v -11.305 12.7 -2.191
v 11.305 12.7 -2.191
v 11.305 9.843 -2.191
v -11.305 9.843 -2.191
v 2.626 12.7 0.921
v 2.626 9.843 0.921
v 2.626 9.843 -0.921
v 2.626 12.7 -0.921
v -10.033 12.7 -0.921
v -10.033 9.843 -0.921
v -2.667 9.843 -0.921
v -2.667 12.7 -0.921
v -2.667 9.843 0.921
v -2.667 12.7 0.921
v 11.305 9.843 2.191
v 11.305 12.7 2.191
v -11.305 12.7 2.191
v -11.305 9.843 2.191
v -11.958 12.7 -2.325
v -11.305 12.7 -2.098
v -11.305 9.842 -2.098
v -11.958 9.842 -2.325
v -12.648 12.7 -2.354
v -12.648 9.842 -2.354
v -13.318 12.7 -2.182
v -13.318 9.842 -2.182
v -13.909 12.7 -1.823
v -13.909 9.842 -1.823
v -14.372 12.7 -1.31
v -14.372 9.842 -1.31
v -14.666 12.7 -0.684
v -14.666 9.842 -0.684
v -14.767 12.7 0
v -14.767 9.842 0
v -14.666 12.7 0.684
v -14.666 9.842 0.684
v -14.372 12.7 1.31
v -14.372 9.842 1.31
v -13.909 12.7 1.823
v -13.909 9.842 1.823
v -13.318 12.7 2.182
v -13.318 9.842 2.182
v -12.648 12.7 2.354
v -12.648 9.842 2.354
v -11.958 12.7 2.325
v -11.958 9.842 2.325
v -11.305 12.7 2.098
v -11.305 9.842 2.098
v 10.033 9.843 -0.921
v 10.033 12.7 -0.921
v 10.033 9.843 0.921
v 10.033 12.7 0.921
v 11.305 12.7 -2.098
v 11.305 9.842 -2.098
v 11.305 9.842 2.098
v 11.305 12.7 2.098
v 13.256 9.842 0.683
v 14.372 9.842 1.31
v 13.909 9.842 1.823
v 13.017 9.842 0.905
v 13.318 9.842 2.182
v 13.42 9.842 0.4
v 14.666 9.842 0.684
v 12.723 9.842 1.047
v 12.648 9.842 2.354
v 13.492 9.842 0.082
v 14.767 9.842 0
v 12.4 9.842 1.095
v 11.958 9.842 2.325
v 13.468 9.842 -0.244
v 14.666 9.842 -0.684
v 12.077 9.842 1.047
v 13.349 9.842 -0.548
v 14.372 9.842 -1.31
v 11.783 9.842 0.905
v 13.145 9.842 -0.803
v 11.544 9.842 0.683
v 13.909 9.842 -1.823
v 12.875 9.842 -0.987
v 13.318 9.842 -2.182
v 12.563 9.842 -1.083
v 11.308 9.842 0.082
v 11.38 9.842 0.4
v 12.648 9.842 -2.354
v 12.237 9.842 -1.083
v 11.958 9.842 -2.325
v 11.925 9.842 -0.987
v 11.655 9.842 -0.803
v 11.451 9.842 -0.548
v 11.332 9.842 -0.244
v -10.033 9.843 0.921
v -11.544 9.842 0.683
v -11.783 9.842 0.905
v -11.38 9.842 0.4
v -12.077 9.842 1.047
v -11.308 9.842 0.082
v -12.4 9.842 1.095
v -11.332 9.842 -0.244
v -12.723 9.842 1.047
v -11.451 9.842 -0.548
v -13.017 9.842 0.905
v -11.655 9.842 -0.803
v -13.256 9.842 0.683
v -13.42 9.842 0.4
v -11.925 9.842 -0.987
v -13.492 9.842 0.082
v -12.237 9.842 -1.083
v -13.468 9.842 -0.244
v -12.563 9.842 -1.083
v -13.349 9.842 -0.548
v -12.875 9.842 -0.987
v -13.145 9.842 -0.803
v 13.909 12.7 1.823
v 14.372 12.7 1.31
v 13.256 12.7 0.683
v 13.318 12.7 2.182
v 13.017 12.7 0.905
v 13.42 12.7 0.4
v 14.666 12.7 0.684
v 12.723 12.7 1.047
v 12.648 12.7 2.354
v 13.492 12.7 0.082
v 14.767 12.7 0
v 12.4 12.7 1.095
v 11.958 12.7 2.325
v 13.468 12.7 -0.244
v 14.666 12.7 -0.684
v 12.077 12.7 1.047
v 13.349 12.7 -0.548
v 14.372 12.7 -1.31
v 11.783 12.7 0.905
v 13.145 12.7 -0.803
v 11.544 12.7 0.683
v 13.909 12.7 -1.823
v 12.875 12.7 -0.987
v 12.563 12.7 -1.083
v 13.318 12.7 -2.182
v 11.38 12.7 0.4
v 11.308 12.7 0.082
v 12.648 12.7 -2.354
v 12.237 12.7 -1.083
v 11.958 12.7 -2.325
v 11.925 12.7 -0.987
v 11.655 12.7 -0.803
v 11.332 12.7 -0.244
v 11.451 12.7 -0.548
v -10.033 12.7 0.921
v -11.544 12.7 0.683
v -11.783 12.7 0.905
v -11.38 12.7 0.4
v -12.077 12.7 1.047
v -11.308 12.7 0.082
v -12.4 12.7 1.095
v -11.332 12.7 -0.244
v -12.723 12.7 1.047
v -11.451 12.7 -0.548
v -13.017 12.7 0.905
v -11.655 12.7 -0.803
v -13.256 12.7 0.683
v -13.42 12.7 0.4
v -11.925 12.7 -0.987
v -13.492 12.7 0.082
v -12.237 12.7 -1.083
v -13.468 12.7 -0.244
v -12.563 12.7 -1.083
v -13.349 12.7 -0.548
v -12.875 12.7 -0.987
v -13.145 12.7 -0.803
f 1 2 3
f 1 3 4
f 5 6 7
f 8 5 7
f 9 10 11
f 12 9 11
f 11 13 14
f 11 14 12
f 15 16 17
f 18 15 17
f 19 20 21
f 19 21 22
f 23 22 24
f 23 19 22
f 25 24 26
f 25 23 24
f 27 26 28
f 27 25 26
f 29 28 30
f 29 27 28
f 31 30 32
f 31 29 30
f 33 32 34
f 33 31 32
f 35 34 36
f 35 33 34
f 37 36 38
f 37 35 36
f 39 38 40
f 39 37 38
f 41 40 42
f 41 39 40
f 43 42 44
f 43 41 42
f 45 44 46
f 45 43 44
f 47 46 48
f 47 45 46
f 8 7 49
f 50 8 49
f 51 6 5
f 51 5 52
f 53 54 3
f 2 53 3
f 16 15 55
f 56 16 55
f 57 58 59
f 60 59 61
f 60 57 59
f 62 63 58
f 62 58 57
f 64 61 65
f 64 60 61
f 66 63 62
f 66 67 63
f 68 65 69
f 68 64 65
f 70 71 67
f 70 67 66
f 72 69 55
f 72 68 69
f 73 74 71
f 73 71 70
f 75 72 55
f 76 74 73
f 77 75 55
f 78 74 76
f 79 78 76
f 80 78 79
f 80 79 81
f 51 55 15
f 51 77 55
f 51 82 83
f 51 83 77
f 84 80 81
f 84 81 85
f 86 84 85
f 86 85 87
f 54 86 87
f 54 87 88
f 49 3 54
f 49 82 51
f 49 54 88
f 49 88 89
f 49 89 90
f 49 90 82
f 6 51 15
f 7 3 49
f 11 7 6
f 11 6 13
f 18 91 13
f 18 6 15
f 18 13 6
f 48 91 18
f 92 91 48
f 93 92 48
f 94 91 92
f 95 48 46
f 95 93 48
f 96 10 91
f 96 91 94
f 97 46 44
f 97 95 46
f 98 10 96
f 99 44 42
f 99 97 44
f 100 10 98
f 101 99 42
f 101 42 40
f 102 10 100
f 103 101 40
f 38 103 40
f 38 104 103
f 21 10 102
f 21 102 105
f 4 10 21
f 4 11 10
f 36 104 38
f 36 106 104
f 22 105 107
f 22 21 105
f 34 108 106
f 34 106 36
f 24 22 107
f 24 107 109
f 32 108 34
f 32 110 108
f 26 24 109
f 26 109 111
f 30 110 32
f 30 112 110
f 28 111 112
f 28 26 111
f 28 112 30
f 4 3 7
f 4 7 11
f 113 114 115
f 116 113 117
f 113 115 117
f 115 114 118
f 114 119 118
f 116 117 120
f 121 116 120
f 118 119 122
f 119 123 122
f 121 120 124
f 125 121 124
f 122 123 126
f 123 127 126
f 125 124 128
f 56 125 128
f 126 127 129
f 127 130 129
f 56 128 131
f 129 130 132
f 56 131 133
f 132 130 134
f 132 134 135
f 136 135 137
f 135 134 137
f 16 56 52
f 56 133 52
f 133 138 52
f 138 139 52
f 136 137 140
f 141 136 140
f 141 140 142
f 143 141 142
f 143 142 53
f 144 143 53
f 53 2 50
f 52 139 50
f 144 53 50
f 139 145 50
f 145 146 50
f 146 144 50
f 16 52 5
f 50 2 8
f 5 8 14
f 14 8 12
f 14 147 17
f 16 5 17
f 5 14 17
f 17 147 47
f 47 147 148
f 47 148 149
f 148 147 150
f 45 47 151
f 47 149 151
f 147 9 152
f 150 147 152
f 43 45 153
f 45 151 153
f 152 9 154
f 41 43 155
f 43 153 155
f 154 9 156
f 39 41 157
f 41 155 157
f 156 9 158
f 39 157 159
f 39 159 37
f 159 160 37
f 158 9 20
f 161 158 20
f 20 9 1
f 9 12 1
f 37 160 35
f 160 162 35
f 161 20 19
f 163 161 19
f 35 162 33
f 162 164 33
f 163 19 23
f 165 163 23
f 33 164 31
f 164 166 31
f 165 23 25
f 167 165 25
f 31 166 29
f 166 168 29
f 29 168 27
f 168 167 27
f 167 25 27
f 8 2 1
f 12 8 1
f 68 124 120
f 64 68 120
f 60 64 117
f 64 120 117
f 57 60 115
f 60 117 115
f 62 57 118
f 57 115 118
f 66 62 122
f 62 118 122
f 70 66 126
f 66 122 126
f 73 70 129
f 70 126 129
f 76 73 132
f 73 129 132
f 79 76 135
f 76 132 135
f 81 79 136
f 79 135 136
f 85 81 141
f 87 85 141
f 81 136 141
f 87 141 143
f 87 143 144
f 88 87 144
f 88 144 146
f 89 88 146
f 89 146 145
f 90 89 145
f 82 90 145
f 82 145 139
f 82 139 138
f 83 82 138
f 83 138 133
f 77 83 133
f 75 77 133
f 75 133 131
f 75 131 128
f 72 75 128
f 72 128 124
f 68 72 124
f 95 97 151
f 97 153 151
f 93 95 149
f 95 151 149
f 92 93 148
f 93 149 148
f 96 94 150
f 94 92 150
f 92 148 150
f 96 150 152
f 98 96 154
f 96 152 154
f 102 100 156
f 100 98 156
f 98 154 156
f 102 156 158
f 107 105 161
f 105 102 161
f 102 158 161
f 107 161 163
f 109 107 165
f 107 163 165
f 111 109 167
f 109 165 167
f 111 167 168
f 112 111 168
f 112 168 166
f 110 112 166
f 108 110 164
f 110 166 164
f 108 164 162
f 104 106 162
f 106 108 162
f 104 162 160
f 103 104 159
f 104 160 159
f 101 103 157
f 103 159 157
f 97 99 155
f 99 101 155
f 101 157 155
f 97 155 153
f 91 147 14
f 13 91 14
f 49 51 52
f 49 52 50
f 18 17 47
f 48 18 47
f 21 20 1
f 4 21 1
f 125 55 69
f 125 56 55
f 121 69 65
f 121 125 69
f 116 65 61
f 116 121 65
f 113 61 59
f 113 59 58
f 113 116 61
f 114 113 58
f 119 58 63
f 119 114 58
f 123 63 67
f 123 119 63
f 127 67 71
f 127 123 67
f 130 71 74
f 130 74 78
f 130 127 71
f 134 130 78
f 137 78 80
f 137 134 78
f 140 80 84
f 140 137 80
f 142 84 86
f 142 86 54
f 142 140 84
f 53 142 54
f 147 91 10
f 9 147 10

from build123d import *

# Parameters (mm, degrees)
SKETCH1_W                = 22.609360872
SKETCH1_H                = 4.3815
SKETCH1_W_2              = 7.366
SKETCH1_H_2              = 1.8415
SKETCH1_W_3              = 7.407296779
BOSS_EXTRUDE1_DEPTH      = 6.35
BOSS_EXTRUDE2_REACH      = 15.15
BOSS_EXTRUDE3_START      = 2.19075
BOSS_EXTRUDE3_DEPTH      = 2.19075
SKETCH7_R                = 1.5875
BOSS_EXTRUDE4_DEPTH      = 1.27
MIRROR2_COPY_1_SKETCH_R  = 1.5875
MIRROR2_COPY_1_DEPTH     = 1.27
BOSS_EXTRUDE5_DEPTH      = 6.35
BOSS_EXTRUDE5_DEPTH_BACK = 1.27
SKETCH8_R                = 0.635
SKETCH9_W                = 22.609360872
SKETCH9_H                = 6.35
BOSS_EXTRUDE6_DEPTH      = 4.3815
SKETCH10_W               = 6.35
SKETCH10_H               = 1.8415
CUT_EXTRUDE1_DEPTH       = 12.7
CUT_EXTRUDE2_DEPTH       = 23.114
CUT_EXTRUDE2_DEPTH_BACK  = 4.7625
SKETCH12_W               = 31.633822951
SKETCH12_H               = 14.456952732
SKETCH13_W               = 7.366
SKETCH13_H               = 1.8415
SKETCH13_W_2             = 7.407296779
CUT_EXTRUDE3_DEPTH       = 12.7
SKETCH15_W               = 5.299628269
SKETCH15_H               = 4.3815
SKETCH15_W_2             = 5.528427798
CUT_EXTRUDE5_DEPTH       = 2.8575
SKETCH14_R               = 2.367055436
SKETCH14_R_2             = 1.095375
BOSS_EXTRUDE9_DEPTH      = 2.8575


with BuildPart() as part:
    # Sketch1 → Boss-Extrude1 (new body)
    with BuildSketch(Plane(origin=(0, 0, 0), x_dir=(1, 0, 0), z_dir=(0, 1, 0))):
        Rectangle(SKETCH1_W, SKETCH1_H)
        with Locations((-6.35, 0)):
            Rectangle(SKETCH1_W_2, SKETCH1_H_2, mode=Mode.SUBTRACT)
        with Locations((6.329351611, 0)):
            Rectangle(SKETCH1_W_3, SKETCH1_H_2, mode=Mode.SUBTRACT)
    extrude(amount=BOSS_EXTRUDE1_DEPTH)

    # Boss-Extrude2: up to this face of the body (flat: up to its plane)
    boss_extrude2_end = Plane(part.part.faces().sort_by_distance((0, 3.175, -2.19075))[0])
    # Sketch2 → Boss-Extrude2 (add, up to the picked face)
    with BuildSketch(Plane.XY, mode=Mode.PRIVATE) as boss_extrude2_sk1:
        with BuildLine():
            Line((3.175, 0), (-3.175, 0))
            ThreePointArc((-3.175, 0), (0, -3.175), (3.175, 0))
        make_face()
    boss_extrude2_tool1 = split(extrude(boss_extrude2_sk1.sketch, amount=-BOSS_EXTRUDE2_REACH, mode=Mode.PRIVATE), bisect_by=boss_extrude2_end, keep=Keep.BOTH, mode=Mode.PRIVATE)
    add(boss_extrude2_tool1.solids().sort_by(Axis((0, -1.347512, 0), (0, 0, -1)))[0])

    # Sketch2<3> → Boss-Extrude3 (add)
    with BuildSketch(Plane.XY.offset(BOSS_EXTRUDE3_START)):
        with BuildLine():
            Line((3.175, 0), (-3.175, 0))
            ThreePointArc((-3.175, 0), (0, -3.175), (3.175, 0))
        make_face()
    extrude(amount=-BOSS_EXTRUDE3_DEPTH)

    # Sketch7 → Boss-Extrude4 (add)
    with BuildSketch(Plane.XY.offset(2.19075)):
        with BuildLine():
            Line((-9.525, 0), (-11.304680436, 0))
            Line((-11.304680436, 0), (-11.304680436, -12.7))
            ThreePointArc((-11.304680436, -12.7), (-8.266575896, -13.958424104), (-9.525, -10.920319564))
            Line((-9.525, -10.920319564), (-9.525, 0))
        make_face()
        with Locations((-9.525, -12.7)):
            Circle(SKETCH7_R, mode=Mode.SUBTRACT)
    boss_extrude4 = extrude(amount=-BOSS_EXTRUDE4_DEPTH)

    # Mirror1: Boss-Extrude4 across plane
    add(boss_extrude4.mirror(Plane(origin=(0, 0, 0), x_dir=(0, 0, 1), z_dir=(1, 0, 0))))

    # Mirror2: Boss-Extrude4 across plane
    add(boss_extrude4.mirror(Plane.XY))

    # Mirror2 copy 1 sketch → Mirror2 copy 1 (add)
    with BuildSketch(Plane(origin=(0, 0, -2.19075), x_dir=(-1, 0, 0), z_dir=(0, 0, -1))):
        with BuildLine():
            Line((-9.525, 0), (-11.304680436, 0))
            Line((-11.304680436, 0), (-11.304680436, -12.7))
            ThreePointArc((-11.304680436, -12.7), (-8.266575896, -13.958424104), (-9.525, -10.920319564))
            Line((-9.525, -10.920319564), (-9.525, 0))
        make_face()
        with Locations((-9.525, -12.7)):
            Circle(MIRROR2_COPY_1_SKETCH_R, mode=Mode.SUBTRACT)
    extrude(amount=-MIRROR2_COPY_1_DEPTH)

    # Sketch8 → Boss-Extrude5 (add, two sides: drawn at the far end of the back side and taken through both)
    # profile 1 of 2: a face of its own
    with BuildSketch(Plane(origin=(0, 6.35, 0), x_dir=(1, 0, 0), z_dir=(0, 1, 0)).offset(-BOSS_EXTRUDE5_DEPTH_BACK)):
        with BuildLine():
            Line((-11.304680436, 2.19075), (-11.304680436, -2.19075))
            ThreePointArc((-11.304680436, -2.19075), (-13.495430436, 0), (-11.304680436, 2.19075))
        make_face()
        with Locations(Location((-12.400055436, 0, 0), (0, 0, 270))):
            Circle(SKETCH8_R, mode=Mode.SUBTRACT)
    # profile 2 of 2: a face of its own
    with BuildSketch(Plane(origin=(0, 6.35, 0), x_dir=(1, 0, 0), z_dir=(0, 1, 0)).offset(-BOSS_EXTRUDE5_DEPTH_BACK)):
        with BuildLine():
            Line((11.304680436, 2.19075), (11.304680436, -2.19075))
            ThreePointArc((11.304680436, -2.19075), (13.495430436, 0), (11.304680436, 2.19075))
        make_face()
        with Locations(Location((12.400055436, 0, 0), (0, 0, 90))):
            Circle(SKETCH8_R, mode=Mode.SUBTRACT)
    extrude(amount=BOSS_EXTRUDE5_DEPTH + BOSS_EXTRUDE5_DEPTH_BACK)

    # Sketch9 → Boss-Extrude6 (add)
    with BuildSketch(Plane(origin=(0, 0, -2.19075), x_dir=(-1, 0, 0), z_dir=(0, 0, -1))):
        with Locations((0, 9.525)):
            Rectangle(SKETCH9_W, SKETCH9_H)
    extrude(amount=-BOSS_EXTRUDE6_DEPTH)

    # Sketch10 → Cut-Extrude1 (cut)
    with BuildSketch(Plane(origin=(0, 12.7, 0), x_dir=(1, 0, 0), z_dir=(0, 1, 0))):
        with Locations((6.308703221, 0)):
            Rectangle(SKETCH10_W, SKETCH10_H)
        with Locations((-6.35, 0)):
            Rectangle(SKETCH10_W, SKETCH10_H)
    extrude(amount=-CUT_EXTRUDE1_DEPTH, mode=Mode.SUBTRACT)

    # Sketch12 → Cut-Extrude2 (cut, two sides: drawn at the far end of the back side and taken through both)
    with BuildSketch(Plane(origin=(0, 5.08, 0), x_dir=(-1, 0, 0), z_dir=(0, -1, 0)).offset(-CUT_EXTRUDE2_DEPTH_BACK)):
        with Locations((-0.08433307, 1.389523064)):
            Rectangle(SKETCH12_W, SKETCH12_H)
    extrude(amount=CUT_EXTRUDE2_DEPTH + CUT_EXTRUDE2_DEPTH_BACK, mode=Mode.SUBTRACT)

    # Sketch13 → Cut-Extrude3 (cut)
    with BuildSketch(Plane(origin=(0, 0, 0), x_dir=(1, 0, 0), z_dir=(0, 1, 0))):
        with Locations((-6.35, 0)):
            Rectangle(SKETCH13_W, SKETCH13_H)
        with Locations((6.329351611, 0)):
            Rectangle(SKETCH13_W_2, SKETCH13_H)
    extrude(amount=CUT_EXTRUDE3_DEPTH, mode=Mode.SUBTRACT)

    # Sketch15 → Cut-Extrude5 (cut)
    with BuildSketch(Plane(origin=(0, 12.7, 0), x_dir=(1, 0, 0), z_dir=(0, 1, 0))):
        with Locations((-13.95449457, 0)):
            Rectangle(SKETCH15_W, SKETCH15_H)
        with Locations((14.068894335, 0)):
            Rectangle(SKETCH15_W_2, SKETCH15_H)
    extrude(amount=-CUT_EXTRUDE5_DEPTH, mode=Mode.SUBTRACT)

    # Sketch14 → Boss-Extrude9 (add)
    # profile 1 of 2: a face of its own
    with BuildSketch(Plane(origin=(0, 12.7, 0), x_dir=(1, 0, 0), z_dir=(0, 1, 0))):
        with Locations((-12.400055436, 0)):
            Circle(SKETCH14_R)
        with Locations(Location((-12.400055436, 0, 0), (0, 0, 270))):
            Circle(SKETCH14_R_2, mode=Mode.SUBTRACT)
    # profile 2 of 2: a face of its own
    with BuildSketch(Plane(origin=(0, 12.7, 0), x_dir=(1, 0, 0), z_dir=(0, 1, 0))):
        with Locations((12.400055436, 0)):
            Circle(SKETCH14_R)
        with Locations(Location((12.400055436, 0, 0), (0, 0, 270))):
            Circle(SKETCH14_R_2, mode=Mode.SUBTRACT)
    extrude(amount=-BOSS_EXTRUDE9_DEPTH)


solid = part.part
